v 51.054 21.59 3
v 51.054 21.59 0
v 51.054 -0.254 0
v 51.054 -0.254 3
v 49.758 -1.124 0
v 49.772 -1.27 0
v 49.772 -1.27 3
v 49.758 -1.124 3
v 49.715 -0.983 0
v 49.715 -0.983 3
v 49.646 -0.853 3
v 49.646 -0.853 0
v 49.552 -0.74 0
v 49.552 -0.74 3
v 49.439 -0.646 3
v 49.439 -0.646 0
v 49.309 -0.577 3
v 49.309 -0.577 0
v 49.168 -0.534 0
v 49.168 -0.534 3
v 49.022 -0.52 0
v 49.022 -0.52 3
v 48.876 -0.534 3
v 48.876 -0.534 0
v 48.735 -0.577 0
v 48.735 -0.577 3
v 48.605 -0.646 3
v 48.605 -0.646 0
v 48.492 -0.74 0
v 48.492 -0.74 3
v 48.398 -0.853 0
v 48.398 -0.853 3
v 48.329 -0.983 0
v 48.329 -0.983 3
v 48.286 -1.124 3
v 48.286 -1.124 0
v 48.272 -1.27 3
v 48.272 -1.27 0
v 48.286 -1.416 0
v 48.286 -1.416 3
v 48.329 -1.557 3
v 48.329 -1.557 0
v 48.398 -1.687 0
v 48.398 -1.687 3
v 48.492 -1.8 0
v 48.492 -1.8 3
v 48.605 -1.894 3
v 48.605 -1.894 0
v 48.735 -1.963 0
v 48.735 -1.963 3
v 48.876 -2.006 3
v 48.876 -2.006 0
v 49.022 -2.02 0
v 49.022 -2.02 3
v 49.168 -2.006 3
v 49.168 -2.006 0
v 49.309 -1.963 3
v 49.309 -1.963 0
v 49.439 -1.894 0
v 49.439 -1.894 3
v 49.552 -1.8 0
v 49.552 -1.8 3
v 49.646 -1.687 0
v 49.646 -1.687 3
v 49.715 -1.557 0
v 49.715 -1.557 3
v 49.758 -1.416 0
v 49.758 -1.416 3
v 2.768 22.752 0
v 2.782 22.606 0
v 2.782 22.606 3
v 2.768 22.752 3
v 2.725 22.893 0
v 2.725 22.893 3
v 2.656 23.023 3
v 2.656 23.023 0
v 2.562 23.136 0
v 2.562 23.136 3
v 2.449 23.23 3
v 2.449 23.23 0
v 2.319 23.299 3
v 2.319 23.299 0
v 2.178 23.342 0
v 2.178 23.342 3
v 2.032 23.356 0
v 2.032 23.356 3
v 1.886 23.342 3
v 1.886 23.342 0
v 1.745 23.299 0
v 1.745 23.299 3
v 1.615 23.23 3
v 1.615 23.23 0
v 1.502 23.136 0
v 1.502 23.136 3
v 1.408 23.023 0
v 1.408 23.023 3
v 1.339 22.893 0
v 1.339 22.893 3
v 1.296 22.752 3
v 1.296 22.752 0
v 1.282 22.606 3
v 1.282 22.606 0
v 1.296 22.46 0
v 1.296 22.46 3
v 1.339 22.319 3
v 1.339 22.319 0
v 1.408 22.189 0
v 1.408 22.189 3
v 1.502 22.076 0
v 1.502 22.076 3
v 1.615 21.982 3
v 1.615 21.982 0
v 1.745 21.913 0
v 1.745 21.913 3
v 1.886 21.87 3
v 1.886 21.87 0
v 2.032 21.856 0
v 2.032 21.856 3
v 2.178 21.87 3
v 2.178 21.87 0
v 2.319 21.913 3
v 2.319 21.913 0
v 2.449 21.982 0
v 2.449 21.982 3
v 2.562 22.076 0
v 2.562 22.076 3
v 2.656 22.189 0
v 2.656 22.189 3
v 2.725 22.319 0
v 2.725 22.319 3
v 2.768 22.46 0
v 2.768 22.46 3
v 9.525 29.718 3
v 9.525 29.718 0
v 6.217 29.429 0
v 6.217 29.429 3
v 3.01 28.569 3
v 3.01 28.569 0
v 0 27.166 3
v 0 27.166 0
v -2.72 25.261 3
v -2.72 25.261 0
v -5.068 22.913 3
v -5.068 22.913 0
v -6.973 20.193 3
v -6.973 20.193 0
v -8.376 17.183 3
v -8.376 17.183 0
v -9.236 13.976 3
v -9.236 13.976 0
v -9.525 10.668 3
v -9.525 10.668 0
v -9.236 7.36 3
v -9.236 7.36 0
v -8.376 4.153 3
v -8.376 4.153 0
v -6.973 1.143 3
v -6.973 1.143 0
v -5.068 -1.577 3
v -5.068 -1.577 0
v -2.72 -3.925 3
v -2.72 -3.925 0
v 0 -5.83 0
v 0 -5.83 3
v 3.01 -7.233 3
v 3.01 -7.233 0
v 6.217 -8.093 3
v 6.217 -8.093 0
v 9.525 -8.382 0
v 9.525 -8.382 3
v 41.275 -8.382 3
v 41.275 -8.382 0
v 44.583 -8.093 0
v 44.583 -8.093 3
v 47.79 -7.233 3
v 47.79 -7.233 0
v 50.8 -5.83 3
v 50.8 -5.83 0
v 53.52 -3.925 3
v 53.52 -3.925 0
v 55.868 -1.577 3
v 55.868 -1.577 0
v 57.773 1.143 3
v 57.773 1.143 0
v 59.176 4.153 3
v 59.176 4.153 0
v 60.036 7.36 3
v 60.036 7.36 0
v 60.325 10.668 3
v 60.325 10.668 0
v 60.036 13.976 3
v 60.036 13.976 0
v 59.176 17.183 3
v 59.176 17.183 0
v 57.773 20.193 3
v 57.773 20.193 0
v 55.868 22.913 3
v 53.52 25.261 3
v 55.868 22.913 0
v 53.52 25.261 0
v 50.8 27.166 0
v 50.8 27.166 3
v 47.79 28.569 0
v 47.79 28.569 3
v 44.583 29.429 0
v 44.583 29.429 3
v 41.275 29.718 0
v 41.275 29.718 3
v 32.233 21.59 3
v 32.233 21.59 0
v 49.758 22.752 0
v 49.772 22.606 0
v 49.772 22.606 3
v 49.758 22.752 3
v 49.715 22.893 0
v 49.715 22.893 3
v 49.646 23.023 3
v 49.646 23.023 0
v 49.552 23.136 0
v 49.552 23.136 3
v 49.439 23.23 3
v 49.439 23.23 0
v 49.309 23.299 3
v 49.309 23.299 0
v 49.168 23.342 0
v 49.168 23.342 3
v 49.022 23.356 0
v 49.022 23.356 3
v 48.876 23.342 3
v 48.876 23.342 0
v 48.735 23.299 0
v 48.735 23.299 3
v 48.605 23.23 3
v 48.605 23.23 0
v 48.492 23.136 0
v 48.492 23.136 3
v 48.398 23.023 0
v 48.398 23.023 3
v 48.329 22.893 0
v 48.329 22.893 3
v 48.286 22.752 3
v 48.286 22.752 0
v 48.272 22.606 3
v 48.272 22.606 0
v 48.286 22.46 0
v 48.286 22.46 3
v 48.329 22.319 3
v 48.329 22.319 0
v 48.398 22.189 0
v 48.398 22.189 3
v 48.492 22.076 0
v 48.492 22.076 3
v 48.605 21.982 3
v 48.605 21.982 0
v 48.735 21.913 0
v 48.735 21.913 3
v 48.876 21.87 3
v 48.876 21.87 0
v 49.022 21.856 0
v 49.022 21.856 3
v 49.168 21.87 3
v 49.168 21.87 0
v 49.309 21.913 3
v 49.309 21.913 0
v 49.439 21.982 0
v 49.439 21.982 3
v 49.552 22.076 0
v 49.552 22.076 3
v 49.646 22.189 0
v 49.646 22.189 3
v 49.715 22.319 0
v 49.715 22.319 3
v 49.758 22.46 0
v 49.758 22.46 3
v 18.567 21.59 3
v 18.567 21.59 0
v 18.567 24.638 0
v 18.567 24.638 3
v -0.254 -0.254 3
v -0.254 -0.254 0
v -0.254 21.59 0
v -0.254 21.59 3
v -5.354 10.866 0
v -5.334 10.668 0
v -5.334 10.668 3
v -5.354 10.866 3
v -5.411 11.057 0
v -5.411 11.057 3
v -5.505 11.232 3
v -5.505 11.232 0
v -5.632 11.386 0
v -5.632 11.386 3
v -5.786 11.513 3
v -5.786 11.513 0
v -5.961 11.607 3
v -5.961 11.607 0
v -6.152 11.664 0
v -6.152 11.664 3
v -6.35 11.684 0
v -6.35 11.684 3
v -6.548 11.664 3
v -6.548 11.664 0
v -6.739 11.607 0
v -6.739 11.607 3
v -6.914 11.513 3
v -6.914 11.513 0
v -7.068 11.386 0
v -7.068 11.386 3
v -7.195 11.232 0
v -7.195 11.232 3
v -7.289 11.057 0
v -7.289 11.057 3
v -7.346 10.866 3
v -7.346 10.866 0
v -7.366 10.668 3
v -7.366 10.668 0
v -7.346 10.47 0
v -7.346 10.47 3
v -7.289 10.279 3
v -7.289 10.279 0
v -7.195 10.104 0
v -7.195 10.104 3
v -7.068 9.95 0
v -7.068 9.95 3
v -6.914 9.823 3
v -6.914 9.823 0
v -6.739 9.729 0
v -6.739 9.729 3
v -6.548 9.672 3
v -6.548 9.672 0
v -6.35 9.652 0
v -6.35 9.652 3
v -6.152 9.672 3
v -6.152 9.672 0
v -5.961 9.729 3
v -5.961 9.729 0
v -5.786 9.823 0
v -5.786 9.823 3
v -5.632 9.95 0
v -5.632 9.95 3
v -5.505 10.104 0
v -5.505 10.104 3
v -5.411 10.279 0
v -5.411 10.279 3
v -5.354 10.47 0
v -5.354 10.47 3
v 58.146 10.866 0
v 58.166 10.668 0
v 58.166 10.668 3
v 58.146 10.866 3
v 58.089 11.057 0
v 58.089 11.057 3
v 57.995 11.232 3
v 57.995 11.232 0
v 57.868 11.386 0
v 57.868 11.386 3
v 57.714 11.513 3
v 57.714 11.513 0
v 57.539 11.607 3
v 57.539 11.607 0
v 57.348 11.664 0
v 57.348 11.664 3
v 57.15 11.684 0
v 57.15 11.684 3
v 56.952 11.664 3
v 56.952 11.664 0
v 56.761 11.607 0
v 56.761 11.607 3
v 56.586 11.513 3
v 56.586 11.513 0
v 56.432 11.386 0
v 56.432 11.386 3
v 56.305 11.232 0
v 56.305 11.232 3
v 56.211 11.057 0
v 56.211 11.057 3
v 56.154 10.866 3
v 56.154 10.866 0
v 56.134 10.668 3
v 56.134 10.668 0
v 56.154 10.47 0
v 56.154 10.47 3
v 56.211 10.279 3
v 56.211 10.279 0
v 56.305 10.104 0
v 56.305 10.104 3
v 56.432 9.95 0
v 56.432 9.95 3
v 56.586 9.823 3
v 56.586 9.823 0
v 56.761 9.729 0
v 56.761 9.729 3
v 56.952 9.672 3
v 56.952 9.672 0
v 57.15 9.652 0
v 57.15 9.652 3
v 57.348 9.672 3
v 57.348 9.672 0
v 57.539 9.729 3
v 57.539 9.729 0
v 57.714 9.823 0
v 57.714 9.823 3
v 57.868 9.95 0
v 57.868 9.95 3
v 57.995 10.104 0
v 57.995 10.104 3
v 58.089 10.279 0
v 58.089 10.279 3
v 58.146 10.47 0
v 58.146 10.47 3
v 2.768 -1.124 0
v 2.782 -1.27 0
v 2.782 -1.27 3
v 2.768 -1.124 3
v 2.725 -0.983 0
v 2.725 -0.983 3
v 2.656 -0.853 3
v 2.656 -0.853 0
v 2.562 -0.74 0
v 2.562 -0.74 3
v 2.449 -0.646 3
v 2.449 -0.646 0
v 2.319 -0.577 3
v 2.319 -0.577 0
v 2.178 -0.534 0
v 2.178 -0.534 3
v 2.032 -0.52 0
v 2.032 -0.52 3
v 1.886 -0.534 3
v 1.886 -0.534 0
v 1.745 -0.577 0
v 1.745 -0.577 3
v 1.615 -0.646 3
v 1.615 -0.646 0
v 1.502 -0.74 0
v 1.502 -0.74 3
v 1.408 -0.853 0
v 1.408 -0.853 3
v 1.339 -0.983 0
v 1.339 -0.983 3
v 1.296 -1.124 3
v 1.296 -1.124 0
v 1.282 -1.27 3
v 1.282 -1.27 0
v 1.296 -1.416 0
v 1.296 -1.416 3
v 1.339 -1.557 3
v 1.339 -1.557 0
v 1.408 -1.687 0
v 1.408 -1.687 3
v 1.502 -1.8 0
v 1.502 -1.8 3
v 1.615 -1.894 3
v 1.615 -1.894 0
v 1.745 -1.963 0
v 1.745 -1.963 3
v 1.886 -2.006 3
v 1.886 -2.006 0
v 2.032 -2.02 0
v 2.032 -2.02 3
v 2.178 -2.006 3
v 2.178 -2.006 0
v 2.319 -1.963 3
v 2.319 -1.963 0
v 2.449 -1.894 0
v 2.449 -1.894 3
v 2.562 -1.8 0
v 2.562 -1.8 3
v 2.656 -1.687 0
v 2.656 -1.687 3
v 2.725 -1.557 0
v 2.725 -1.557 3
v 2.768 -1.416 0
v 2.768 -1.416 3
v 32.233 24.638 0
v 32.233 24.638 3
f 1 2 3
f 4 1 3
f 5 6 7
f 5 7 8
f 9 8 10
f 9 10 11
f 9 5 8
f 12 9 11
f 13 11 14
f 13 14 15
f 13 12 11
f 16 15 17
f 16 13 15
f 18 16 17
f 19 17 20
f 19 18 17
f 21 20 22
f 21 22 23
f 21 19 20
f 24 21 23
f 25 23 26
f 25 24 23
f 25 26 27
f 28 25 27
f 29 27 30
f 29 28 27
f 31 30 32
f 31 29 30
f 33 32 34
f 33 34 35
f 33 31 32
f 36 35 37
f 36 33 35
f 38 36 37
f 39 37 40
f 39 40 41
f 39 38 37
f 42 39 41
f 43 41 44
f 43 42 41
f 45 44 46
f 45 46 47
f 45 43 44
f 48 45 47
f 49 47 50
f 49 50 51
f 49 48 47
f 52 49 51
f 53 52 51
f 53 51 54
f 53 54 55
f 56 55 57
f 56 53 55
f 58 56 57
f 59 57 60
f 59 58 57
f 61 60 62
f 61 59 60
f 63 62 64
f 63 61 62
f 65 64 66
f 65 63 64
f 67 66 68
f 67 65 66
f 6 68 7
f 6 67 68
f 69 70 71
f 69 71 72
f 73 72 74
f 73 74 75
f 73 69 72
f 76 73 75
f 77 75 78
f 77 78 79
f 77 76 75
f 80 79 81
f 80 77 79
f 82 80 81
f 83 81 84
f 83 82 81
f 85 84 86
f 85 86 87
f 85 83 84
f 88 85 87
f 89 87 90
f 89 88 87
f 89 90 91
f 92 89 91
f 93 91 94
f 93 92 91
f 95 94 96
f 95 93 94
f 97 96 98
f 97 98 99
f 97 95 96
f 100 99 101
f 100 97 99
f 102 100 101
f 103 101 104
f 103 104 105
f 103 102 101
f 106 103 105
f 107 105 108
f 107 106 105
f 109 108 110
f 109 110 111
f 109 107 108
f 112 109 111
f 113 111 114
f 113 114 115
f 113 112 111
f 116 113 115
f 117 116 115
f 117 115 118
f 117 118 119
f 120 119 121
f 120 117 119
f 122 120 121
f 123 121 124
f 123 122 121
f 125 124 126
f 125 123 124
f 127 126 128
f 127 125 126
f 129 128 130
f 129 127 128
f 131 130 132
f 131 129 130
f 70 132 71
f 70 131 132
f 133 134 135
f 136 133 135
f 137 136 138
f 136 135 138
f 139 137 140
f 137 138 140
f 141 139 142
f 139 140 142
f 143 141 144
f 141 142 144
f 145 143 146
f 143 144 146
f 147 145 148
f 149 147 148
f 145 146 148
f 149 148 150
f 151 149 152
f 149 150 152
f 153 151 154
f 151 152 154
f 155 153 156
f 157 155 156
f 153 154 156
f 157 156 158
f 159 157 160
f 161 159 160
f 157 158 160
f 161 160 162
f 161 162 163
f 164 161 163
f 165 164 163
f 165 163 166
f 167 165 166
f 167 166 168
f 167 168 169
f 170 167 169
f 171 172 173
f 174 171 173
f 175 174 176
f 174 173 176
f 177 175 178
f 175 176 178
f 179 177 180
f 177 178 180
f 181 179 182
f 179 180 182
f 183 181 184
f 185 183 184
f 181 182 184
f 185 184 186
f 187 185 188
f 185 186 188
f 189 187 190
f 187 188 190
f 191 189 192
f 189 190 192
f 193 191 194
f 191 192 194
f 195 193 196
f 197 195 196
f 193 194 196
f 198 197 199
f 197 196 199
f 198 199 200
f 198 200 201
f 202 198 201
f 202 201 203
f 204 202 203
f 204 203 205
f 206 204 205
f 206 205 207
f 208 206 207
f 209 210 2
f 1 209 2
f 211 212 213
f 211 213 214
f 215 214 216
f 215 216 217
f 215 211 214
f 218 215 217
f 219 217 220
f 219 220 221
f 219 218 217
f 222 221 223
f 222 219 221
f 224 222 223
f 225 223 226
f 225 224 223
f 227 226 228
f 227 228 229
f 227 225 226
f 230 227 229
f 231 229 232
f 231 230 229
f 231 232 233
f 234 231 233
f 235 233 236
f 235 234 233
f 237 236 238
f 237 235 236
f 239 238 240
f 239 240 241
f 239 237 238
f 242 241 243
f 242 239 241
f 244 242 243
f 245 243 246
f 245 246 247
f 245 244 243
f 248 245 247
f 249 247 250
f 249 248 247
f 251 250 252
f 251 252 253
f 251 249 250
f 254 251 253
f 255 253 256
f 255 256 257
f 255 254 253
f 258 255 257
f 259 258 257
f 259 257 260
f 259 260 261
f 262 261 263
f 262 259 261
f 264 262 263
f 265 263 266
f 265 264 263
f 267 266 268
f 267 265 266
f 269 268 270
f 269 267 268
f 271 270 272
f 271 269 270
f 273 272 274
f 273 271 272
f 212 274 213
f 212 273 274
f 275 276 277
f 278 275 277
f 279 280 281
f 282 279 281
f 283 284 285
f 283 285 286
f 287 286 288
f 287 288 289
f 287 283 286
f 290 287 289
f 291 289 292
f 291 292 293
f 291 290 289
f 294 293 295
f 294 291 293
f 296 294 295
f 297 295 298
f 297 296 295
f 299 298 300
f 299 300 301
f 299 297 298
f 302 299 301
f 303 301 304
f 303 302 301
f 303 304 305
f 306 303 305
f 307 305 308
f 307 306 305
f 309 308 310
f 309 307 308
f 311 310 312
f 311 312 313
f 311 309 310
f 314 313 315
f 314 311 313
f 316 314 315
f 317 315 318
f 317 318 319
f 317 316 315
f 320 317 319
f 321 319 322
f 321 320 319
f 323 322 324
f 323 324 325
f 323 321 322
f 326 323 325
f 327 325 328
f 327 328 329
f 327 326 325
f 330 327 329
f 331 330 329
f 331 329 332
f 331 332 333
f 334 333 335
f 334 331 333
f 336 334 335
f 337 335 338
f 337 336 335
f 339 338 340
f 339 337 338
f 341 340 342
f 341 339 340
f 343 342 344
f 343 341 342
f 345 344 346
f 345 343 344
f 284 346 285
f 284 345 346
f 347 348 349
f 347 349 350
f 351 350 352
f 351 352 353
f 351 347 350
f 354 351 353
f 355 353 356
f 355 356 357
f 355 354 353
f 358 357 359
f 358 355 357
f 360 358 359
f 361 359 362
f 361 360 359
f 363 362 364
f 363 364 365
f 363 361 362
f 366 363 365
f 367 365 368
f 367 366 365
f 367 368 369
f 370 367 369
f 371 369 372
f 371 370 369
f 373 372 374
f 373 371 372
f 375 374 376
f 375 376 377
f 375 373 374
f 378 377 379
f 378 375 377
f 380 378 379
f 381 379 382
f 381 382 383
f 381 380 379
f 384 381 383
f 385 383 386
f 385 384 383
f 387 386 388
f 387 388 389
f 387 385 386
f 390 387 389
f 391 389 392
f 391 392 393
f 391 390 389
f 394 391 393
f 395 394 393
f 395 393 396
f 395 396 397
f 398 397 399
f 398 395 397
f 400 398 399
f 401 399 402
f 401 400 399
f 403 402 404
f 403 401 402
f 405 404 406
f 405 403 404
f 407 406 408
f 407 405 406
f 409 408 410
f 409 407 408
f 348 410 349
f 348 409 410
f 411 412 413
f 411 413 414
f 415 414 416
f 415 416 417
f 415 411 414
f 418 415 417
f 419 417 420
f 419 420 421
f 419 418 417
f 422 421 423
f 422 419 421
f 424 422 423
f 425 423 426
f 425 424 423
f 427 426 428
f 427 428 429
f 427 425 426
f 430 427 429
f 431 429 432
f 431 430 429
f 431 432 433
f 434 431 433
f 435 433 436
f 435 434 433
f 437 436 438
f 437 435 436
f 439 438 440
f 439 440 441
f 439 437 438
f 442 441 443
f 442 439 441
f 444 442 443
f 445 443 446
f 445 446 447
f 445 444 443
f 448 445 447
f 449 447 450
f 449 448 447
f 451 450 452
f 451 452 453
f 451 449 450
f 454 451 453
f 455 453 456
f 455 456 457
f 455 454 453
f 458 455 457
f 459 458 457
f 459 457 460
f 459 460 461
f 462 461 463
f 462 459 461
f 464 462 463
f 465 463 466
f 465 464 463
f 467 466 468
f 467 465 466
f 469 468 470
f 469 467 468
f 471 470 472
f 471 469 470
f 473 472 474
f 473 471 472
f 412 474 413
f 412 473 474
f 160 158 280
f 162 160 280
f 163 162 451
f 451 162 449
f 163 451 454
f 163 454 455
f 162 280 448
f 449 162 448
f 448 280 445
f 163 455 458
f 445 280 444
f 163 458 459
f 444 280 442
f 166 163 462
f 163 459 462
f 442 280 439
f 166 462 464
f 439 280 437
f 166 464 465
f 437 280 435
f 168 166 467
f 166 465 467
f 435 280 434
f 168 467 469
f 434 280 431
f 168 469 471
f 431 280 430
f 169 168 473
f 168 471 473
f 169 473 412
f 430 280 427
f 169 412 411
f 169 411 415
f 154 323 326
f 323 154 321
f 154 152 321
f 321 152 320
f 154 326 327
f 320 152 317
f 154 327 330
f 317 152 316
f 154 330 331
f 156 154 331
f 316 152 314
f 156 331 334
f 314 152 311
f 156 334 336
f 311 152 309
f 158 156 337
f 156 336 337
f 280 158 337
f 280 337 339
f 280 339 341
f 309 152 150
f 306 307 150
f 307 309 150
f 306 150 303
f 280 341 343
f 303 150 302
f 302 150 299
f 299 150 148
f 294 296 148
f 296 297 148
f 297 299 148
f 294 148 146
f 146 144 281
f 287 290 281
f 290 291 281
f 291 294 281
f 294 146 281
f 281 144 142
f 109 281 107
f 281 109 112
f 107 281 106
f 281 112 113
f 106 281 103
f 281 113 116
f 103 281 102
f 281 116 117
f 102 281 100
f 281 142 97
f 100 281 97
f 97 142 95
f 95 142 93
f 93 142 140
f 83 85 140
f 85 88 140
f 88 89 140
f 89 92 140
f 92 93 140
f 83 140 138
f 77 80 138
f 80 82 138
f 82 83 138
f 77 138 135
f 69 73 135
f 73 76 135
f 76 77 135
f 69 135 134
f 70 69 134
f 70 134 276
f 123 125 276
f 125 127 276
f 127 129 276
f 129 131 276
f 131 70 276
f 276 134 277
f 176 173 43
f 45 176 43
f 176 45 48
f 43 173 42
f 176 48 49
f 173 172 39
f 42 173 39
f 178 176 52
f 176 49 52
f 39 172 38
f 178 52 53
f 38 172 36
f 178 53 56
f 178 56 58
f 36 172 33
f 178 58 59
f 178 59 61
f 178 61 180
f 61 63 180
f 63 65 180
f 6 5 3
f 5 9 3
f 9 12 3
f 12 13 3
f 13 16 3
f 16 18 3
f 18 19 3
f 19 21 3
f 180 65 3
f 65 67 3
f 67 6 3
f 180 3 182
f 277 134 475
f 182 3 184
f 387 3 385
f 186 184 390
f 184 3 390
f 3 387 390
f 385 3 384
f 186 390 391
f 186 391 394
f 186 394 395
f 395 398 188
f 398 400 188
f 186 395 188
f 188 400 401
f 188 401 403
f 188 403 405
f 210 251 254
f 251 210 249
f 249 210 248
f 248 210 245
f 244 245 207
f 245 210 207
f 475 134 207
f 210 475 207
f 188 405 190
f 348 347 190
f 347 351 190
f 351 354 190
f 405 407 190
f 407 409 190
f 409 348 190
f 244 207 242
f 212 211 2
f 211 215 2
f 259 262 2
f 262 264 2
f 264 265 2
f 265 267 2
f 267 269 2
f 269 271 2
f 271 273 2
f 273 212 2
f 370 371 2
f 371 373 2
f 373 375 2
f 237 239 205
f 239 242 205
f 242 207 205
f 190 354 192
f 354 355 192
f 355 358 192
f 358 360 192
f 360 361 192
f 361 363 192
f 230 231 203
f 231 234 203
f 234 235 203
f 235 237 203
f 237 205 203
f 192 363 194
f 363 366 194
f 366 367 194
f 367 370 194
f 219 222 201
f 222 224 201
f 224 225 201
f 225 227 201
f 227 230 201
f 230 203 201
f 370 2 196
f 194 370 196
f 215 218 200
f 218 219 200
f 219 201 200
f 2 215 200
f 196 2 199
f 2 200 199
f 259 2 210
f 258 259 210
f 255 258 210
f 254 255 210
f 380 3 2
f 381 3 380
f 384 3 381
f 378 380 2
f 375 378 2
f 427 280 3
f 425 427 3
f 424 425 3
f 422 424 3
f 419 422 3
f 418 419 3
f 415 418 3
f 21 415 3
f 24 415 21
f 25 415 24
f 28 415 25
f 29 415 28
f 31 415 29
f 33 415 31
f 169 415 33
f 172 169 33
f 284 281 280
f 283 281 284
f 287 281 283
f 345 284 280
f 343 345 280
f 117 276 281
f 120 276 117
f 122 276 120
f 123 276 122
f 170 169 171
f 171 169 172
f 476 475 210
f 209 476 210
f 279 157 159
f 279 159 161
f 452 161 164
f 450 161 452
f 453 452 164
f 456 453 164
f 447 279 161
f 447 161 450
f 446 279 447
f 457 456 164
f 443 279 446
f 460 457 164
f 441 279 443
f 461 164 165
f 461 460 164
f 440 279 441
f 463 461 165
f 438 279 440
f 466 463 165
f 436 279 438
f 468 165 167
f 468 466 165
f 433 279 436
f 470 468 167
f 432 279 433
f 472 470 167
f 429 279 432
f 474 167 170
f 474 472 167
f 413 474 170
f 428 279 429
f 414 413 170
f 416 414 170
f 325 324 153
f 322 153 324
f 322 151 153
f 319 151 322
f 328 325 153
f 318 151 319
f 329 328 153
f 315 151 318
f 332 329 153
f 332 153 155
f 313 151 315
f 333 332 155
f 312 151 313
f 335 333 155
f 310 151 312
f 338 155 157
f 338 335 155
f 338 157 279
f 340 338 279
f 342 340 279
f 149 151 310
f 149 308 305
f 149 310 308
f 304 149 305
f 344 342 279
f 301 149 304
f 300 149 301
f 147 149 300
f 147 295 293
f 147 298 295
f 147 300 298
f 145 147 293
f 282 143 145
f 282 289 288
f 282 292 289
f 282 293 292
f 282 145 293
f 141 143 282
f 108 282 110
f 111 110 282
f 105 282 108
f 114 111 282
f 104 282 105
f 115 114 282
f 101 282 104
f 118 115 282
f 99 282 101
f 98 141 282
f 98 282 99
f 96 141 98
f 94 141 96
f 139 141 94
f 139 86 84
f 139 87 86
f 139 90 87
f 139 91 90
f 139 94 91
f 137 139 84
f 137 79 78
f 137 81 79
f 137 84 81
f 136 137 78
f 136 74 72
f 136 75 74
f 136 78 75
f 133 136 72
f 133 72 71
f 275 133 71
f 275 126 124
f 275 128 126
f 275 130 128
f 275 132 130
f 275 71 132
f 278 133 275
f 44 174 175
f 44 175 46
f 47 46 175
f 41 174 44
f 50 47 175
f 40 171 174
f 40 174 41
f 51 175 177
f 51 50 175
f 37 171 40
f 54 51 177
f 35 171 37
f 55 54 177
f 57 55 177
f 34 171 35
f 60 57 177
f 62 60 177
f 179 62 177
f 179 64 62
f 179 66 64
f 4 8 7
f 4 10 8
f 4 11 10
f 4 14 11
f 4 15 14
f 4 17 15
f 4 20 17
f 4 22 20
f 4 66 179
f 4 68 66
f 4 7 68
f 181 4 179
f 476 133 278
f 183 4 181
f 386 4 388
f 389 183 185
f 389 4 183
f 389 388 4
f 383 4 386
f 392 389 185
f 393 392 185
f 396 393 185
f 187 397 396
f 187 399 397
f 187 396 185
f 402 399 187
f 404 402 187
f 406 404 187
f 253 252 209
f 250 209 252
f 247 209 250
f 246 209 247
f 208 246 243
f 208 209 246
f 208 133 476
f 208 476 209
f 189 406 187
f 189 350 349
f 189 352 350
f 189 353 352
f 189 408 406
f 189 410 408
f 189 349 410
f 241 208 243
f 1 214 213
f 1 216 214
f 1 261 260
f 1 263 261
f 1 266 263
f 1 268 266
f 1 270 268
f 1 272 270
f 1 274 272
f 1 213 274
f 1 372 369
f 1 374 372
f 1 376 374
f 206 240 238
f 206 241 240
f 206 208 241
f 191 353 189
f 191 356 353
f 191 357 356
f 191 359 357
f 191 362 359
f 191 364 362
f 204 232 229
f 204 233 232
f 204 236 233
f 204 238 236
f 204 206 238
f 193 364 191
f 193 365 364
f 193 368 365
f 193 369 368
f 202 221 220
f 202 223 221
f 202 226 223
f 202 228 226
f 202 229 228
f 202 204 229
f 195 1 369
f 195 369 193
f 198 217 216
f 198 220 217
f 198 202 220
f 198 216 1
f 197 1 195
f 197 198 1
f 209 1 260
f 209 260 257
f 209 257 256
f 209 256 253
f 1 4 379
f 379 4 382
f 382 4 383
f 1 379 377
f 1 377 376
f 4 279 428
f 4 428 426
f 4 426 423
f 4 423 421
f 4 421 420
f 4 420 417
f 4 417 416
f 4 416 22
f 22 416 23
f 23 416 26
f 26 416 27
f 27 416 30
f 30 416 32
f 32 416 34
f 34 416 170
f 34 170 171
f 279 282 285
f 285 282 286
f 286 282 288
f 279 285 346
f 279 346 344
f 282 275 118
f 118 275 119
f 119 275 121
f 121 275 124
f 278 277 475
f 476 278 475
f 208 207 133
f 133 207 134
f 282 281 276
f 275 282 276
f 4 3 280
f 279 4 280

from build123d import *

# Parameters (mm, degrees)
SKETCH3_R           = 1.016
SKETCH3_R_2         = 0.75
BOSS_EXTRUDE1_DEPTH = 3


with BuildPart() as part:
    # Sketch3 → Boss-Extrude1 (new body)
    with BuildSketch(Plane.XY):
        with BuildLine():
            Line((9.525, -8.382), (41.275, -8.382))
            ThreePointArc((41.275, -8.382), (60.325, 10.668), (41.275, 29.718))
            Line((41.275, 29.718), (9.525, 29.718))
            ThreePointArc((9.525, 29.718), (-9.525, 10.668), (9.525, -8.382))
        make_face()
        with Locations((57.15, 10.668)):
            Circle(SKETCH3_R, mode=Mode.SUBTRACT)
        with Locations((-6.35, 10.668)):
            Circle(SKETCH3_R, mode=Mode.SUBTRACT)
        with Locations((2.032, 22.606)):
            Circle(SKETCH3_R_2, mode=Mode.SUBTRACT)
        with Locations((2.032, -1.27)):
            Circle(SKETCH3_R_2, mode=Mode.SUBTRACT)
        with Locations((49.022, -1.27)):
            Circle(SKETCH3_R_2, mode=Mode.SUBTRACT)
        with Locations((49.022, 22.606)):
            Circle(SKETCH3_R_2, mode=Mode.SUBTRACT)
        Polygon((18.5674, 24.638), (32.2326, 24.638), (32.2326, 21.59), (51.054, 21.59), (51.054, -0.254), (-0.254, -0.254), (-0.254, 21.59), (18.5674, 21.59), align=None, mode=Mode.SUBTRACT)
    extrude(amount=BOSS_EXTRUDE1_DEPTH)


solid = part.part
